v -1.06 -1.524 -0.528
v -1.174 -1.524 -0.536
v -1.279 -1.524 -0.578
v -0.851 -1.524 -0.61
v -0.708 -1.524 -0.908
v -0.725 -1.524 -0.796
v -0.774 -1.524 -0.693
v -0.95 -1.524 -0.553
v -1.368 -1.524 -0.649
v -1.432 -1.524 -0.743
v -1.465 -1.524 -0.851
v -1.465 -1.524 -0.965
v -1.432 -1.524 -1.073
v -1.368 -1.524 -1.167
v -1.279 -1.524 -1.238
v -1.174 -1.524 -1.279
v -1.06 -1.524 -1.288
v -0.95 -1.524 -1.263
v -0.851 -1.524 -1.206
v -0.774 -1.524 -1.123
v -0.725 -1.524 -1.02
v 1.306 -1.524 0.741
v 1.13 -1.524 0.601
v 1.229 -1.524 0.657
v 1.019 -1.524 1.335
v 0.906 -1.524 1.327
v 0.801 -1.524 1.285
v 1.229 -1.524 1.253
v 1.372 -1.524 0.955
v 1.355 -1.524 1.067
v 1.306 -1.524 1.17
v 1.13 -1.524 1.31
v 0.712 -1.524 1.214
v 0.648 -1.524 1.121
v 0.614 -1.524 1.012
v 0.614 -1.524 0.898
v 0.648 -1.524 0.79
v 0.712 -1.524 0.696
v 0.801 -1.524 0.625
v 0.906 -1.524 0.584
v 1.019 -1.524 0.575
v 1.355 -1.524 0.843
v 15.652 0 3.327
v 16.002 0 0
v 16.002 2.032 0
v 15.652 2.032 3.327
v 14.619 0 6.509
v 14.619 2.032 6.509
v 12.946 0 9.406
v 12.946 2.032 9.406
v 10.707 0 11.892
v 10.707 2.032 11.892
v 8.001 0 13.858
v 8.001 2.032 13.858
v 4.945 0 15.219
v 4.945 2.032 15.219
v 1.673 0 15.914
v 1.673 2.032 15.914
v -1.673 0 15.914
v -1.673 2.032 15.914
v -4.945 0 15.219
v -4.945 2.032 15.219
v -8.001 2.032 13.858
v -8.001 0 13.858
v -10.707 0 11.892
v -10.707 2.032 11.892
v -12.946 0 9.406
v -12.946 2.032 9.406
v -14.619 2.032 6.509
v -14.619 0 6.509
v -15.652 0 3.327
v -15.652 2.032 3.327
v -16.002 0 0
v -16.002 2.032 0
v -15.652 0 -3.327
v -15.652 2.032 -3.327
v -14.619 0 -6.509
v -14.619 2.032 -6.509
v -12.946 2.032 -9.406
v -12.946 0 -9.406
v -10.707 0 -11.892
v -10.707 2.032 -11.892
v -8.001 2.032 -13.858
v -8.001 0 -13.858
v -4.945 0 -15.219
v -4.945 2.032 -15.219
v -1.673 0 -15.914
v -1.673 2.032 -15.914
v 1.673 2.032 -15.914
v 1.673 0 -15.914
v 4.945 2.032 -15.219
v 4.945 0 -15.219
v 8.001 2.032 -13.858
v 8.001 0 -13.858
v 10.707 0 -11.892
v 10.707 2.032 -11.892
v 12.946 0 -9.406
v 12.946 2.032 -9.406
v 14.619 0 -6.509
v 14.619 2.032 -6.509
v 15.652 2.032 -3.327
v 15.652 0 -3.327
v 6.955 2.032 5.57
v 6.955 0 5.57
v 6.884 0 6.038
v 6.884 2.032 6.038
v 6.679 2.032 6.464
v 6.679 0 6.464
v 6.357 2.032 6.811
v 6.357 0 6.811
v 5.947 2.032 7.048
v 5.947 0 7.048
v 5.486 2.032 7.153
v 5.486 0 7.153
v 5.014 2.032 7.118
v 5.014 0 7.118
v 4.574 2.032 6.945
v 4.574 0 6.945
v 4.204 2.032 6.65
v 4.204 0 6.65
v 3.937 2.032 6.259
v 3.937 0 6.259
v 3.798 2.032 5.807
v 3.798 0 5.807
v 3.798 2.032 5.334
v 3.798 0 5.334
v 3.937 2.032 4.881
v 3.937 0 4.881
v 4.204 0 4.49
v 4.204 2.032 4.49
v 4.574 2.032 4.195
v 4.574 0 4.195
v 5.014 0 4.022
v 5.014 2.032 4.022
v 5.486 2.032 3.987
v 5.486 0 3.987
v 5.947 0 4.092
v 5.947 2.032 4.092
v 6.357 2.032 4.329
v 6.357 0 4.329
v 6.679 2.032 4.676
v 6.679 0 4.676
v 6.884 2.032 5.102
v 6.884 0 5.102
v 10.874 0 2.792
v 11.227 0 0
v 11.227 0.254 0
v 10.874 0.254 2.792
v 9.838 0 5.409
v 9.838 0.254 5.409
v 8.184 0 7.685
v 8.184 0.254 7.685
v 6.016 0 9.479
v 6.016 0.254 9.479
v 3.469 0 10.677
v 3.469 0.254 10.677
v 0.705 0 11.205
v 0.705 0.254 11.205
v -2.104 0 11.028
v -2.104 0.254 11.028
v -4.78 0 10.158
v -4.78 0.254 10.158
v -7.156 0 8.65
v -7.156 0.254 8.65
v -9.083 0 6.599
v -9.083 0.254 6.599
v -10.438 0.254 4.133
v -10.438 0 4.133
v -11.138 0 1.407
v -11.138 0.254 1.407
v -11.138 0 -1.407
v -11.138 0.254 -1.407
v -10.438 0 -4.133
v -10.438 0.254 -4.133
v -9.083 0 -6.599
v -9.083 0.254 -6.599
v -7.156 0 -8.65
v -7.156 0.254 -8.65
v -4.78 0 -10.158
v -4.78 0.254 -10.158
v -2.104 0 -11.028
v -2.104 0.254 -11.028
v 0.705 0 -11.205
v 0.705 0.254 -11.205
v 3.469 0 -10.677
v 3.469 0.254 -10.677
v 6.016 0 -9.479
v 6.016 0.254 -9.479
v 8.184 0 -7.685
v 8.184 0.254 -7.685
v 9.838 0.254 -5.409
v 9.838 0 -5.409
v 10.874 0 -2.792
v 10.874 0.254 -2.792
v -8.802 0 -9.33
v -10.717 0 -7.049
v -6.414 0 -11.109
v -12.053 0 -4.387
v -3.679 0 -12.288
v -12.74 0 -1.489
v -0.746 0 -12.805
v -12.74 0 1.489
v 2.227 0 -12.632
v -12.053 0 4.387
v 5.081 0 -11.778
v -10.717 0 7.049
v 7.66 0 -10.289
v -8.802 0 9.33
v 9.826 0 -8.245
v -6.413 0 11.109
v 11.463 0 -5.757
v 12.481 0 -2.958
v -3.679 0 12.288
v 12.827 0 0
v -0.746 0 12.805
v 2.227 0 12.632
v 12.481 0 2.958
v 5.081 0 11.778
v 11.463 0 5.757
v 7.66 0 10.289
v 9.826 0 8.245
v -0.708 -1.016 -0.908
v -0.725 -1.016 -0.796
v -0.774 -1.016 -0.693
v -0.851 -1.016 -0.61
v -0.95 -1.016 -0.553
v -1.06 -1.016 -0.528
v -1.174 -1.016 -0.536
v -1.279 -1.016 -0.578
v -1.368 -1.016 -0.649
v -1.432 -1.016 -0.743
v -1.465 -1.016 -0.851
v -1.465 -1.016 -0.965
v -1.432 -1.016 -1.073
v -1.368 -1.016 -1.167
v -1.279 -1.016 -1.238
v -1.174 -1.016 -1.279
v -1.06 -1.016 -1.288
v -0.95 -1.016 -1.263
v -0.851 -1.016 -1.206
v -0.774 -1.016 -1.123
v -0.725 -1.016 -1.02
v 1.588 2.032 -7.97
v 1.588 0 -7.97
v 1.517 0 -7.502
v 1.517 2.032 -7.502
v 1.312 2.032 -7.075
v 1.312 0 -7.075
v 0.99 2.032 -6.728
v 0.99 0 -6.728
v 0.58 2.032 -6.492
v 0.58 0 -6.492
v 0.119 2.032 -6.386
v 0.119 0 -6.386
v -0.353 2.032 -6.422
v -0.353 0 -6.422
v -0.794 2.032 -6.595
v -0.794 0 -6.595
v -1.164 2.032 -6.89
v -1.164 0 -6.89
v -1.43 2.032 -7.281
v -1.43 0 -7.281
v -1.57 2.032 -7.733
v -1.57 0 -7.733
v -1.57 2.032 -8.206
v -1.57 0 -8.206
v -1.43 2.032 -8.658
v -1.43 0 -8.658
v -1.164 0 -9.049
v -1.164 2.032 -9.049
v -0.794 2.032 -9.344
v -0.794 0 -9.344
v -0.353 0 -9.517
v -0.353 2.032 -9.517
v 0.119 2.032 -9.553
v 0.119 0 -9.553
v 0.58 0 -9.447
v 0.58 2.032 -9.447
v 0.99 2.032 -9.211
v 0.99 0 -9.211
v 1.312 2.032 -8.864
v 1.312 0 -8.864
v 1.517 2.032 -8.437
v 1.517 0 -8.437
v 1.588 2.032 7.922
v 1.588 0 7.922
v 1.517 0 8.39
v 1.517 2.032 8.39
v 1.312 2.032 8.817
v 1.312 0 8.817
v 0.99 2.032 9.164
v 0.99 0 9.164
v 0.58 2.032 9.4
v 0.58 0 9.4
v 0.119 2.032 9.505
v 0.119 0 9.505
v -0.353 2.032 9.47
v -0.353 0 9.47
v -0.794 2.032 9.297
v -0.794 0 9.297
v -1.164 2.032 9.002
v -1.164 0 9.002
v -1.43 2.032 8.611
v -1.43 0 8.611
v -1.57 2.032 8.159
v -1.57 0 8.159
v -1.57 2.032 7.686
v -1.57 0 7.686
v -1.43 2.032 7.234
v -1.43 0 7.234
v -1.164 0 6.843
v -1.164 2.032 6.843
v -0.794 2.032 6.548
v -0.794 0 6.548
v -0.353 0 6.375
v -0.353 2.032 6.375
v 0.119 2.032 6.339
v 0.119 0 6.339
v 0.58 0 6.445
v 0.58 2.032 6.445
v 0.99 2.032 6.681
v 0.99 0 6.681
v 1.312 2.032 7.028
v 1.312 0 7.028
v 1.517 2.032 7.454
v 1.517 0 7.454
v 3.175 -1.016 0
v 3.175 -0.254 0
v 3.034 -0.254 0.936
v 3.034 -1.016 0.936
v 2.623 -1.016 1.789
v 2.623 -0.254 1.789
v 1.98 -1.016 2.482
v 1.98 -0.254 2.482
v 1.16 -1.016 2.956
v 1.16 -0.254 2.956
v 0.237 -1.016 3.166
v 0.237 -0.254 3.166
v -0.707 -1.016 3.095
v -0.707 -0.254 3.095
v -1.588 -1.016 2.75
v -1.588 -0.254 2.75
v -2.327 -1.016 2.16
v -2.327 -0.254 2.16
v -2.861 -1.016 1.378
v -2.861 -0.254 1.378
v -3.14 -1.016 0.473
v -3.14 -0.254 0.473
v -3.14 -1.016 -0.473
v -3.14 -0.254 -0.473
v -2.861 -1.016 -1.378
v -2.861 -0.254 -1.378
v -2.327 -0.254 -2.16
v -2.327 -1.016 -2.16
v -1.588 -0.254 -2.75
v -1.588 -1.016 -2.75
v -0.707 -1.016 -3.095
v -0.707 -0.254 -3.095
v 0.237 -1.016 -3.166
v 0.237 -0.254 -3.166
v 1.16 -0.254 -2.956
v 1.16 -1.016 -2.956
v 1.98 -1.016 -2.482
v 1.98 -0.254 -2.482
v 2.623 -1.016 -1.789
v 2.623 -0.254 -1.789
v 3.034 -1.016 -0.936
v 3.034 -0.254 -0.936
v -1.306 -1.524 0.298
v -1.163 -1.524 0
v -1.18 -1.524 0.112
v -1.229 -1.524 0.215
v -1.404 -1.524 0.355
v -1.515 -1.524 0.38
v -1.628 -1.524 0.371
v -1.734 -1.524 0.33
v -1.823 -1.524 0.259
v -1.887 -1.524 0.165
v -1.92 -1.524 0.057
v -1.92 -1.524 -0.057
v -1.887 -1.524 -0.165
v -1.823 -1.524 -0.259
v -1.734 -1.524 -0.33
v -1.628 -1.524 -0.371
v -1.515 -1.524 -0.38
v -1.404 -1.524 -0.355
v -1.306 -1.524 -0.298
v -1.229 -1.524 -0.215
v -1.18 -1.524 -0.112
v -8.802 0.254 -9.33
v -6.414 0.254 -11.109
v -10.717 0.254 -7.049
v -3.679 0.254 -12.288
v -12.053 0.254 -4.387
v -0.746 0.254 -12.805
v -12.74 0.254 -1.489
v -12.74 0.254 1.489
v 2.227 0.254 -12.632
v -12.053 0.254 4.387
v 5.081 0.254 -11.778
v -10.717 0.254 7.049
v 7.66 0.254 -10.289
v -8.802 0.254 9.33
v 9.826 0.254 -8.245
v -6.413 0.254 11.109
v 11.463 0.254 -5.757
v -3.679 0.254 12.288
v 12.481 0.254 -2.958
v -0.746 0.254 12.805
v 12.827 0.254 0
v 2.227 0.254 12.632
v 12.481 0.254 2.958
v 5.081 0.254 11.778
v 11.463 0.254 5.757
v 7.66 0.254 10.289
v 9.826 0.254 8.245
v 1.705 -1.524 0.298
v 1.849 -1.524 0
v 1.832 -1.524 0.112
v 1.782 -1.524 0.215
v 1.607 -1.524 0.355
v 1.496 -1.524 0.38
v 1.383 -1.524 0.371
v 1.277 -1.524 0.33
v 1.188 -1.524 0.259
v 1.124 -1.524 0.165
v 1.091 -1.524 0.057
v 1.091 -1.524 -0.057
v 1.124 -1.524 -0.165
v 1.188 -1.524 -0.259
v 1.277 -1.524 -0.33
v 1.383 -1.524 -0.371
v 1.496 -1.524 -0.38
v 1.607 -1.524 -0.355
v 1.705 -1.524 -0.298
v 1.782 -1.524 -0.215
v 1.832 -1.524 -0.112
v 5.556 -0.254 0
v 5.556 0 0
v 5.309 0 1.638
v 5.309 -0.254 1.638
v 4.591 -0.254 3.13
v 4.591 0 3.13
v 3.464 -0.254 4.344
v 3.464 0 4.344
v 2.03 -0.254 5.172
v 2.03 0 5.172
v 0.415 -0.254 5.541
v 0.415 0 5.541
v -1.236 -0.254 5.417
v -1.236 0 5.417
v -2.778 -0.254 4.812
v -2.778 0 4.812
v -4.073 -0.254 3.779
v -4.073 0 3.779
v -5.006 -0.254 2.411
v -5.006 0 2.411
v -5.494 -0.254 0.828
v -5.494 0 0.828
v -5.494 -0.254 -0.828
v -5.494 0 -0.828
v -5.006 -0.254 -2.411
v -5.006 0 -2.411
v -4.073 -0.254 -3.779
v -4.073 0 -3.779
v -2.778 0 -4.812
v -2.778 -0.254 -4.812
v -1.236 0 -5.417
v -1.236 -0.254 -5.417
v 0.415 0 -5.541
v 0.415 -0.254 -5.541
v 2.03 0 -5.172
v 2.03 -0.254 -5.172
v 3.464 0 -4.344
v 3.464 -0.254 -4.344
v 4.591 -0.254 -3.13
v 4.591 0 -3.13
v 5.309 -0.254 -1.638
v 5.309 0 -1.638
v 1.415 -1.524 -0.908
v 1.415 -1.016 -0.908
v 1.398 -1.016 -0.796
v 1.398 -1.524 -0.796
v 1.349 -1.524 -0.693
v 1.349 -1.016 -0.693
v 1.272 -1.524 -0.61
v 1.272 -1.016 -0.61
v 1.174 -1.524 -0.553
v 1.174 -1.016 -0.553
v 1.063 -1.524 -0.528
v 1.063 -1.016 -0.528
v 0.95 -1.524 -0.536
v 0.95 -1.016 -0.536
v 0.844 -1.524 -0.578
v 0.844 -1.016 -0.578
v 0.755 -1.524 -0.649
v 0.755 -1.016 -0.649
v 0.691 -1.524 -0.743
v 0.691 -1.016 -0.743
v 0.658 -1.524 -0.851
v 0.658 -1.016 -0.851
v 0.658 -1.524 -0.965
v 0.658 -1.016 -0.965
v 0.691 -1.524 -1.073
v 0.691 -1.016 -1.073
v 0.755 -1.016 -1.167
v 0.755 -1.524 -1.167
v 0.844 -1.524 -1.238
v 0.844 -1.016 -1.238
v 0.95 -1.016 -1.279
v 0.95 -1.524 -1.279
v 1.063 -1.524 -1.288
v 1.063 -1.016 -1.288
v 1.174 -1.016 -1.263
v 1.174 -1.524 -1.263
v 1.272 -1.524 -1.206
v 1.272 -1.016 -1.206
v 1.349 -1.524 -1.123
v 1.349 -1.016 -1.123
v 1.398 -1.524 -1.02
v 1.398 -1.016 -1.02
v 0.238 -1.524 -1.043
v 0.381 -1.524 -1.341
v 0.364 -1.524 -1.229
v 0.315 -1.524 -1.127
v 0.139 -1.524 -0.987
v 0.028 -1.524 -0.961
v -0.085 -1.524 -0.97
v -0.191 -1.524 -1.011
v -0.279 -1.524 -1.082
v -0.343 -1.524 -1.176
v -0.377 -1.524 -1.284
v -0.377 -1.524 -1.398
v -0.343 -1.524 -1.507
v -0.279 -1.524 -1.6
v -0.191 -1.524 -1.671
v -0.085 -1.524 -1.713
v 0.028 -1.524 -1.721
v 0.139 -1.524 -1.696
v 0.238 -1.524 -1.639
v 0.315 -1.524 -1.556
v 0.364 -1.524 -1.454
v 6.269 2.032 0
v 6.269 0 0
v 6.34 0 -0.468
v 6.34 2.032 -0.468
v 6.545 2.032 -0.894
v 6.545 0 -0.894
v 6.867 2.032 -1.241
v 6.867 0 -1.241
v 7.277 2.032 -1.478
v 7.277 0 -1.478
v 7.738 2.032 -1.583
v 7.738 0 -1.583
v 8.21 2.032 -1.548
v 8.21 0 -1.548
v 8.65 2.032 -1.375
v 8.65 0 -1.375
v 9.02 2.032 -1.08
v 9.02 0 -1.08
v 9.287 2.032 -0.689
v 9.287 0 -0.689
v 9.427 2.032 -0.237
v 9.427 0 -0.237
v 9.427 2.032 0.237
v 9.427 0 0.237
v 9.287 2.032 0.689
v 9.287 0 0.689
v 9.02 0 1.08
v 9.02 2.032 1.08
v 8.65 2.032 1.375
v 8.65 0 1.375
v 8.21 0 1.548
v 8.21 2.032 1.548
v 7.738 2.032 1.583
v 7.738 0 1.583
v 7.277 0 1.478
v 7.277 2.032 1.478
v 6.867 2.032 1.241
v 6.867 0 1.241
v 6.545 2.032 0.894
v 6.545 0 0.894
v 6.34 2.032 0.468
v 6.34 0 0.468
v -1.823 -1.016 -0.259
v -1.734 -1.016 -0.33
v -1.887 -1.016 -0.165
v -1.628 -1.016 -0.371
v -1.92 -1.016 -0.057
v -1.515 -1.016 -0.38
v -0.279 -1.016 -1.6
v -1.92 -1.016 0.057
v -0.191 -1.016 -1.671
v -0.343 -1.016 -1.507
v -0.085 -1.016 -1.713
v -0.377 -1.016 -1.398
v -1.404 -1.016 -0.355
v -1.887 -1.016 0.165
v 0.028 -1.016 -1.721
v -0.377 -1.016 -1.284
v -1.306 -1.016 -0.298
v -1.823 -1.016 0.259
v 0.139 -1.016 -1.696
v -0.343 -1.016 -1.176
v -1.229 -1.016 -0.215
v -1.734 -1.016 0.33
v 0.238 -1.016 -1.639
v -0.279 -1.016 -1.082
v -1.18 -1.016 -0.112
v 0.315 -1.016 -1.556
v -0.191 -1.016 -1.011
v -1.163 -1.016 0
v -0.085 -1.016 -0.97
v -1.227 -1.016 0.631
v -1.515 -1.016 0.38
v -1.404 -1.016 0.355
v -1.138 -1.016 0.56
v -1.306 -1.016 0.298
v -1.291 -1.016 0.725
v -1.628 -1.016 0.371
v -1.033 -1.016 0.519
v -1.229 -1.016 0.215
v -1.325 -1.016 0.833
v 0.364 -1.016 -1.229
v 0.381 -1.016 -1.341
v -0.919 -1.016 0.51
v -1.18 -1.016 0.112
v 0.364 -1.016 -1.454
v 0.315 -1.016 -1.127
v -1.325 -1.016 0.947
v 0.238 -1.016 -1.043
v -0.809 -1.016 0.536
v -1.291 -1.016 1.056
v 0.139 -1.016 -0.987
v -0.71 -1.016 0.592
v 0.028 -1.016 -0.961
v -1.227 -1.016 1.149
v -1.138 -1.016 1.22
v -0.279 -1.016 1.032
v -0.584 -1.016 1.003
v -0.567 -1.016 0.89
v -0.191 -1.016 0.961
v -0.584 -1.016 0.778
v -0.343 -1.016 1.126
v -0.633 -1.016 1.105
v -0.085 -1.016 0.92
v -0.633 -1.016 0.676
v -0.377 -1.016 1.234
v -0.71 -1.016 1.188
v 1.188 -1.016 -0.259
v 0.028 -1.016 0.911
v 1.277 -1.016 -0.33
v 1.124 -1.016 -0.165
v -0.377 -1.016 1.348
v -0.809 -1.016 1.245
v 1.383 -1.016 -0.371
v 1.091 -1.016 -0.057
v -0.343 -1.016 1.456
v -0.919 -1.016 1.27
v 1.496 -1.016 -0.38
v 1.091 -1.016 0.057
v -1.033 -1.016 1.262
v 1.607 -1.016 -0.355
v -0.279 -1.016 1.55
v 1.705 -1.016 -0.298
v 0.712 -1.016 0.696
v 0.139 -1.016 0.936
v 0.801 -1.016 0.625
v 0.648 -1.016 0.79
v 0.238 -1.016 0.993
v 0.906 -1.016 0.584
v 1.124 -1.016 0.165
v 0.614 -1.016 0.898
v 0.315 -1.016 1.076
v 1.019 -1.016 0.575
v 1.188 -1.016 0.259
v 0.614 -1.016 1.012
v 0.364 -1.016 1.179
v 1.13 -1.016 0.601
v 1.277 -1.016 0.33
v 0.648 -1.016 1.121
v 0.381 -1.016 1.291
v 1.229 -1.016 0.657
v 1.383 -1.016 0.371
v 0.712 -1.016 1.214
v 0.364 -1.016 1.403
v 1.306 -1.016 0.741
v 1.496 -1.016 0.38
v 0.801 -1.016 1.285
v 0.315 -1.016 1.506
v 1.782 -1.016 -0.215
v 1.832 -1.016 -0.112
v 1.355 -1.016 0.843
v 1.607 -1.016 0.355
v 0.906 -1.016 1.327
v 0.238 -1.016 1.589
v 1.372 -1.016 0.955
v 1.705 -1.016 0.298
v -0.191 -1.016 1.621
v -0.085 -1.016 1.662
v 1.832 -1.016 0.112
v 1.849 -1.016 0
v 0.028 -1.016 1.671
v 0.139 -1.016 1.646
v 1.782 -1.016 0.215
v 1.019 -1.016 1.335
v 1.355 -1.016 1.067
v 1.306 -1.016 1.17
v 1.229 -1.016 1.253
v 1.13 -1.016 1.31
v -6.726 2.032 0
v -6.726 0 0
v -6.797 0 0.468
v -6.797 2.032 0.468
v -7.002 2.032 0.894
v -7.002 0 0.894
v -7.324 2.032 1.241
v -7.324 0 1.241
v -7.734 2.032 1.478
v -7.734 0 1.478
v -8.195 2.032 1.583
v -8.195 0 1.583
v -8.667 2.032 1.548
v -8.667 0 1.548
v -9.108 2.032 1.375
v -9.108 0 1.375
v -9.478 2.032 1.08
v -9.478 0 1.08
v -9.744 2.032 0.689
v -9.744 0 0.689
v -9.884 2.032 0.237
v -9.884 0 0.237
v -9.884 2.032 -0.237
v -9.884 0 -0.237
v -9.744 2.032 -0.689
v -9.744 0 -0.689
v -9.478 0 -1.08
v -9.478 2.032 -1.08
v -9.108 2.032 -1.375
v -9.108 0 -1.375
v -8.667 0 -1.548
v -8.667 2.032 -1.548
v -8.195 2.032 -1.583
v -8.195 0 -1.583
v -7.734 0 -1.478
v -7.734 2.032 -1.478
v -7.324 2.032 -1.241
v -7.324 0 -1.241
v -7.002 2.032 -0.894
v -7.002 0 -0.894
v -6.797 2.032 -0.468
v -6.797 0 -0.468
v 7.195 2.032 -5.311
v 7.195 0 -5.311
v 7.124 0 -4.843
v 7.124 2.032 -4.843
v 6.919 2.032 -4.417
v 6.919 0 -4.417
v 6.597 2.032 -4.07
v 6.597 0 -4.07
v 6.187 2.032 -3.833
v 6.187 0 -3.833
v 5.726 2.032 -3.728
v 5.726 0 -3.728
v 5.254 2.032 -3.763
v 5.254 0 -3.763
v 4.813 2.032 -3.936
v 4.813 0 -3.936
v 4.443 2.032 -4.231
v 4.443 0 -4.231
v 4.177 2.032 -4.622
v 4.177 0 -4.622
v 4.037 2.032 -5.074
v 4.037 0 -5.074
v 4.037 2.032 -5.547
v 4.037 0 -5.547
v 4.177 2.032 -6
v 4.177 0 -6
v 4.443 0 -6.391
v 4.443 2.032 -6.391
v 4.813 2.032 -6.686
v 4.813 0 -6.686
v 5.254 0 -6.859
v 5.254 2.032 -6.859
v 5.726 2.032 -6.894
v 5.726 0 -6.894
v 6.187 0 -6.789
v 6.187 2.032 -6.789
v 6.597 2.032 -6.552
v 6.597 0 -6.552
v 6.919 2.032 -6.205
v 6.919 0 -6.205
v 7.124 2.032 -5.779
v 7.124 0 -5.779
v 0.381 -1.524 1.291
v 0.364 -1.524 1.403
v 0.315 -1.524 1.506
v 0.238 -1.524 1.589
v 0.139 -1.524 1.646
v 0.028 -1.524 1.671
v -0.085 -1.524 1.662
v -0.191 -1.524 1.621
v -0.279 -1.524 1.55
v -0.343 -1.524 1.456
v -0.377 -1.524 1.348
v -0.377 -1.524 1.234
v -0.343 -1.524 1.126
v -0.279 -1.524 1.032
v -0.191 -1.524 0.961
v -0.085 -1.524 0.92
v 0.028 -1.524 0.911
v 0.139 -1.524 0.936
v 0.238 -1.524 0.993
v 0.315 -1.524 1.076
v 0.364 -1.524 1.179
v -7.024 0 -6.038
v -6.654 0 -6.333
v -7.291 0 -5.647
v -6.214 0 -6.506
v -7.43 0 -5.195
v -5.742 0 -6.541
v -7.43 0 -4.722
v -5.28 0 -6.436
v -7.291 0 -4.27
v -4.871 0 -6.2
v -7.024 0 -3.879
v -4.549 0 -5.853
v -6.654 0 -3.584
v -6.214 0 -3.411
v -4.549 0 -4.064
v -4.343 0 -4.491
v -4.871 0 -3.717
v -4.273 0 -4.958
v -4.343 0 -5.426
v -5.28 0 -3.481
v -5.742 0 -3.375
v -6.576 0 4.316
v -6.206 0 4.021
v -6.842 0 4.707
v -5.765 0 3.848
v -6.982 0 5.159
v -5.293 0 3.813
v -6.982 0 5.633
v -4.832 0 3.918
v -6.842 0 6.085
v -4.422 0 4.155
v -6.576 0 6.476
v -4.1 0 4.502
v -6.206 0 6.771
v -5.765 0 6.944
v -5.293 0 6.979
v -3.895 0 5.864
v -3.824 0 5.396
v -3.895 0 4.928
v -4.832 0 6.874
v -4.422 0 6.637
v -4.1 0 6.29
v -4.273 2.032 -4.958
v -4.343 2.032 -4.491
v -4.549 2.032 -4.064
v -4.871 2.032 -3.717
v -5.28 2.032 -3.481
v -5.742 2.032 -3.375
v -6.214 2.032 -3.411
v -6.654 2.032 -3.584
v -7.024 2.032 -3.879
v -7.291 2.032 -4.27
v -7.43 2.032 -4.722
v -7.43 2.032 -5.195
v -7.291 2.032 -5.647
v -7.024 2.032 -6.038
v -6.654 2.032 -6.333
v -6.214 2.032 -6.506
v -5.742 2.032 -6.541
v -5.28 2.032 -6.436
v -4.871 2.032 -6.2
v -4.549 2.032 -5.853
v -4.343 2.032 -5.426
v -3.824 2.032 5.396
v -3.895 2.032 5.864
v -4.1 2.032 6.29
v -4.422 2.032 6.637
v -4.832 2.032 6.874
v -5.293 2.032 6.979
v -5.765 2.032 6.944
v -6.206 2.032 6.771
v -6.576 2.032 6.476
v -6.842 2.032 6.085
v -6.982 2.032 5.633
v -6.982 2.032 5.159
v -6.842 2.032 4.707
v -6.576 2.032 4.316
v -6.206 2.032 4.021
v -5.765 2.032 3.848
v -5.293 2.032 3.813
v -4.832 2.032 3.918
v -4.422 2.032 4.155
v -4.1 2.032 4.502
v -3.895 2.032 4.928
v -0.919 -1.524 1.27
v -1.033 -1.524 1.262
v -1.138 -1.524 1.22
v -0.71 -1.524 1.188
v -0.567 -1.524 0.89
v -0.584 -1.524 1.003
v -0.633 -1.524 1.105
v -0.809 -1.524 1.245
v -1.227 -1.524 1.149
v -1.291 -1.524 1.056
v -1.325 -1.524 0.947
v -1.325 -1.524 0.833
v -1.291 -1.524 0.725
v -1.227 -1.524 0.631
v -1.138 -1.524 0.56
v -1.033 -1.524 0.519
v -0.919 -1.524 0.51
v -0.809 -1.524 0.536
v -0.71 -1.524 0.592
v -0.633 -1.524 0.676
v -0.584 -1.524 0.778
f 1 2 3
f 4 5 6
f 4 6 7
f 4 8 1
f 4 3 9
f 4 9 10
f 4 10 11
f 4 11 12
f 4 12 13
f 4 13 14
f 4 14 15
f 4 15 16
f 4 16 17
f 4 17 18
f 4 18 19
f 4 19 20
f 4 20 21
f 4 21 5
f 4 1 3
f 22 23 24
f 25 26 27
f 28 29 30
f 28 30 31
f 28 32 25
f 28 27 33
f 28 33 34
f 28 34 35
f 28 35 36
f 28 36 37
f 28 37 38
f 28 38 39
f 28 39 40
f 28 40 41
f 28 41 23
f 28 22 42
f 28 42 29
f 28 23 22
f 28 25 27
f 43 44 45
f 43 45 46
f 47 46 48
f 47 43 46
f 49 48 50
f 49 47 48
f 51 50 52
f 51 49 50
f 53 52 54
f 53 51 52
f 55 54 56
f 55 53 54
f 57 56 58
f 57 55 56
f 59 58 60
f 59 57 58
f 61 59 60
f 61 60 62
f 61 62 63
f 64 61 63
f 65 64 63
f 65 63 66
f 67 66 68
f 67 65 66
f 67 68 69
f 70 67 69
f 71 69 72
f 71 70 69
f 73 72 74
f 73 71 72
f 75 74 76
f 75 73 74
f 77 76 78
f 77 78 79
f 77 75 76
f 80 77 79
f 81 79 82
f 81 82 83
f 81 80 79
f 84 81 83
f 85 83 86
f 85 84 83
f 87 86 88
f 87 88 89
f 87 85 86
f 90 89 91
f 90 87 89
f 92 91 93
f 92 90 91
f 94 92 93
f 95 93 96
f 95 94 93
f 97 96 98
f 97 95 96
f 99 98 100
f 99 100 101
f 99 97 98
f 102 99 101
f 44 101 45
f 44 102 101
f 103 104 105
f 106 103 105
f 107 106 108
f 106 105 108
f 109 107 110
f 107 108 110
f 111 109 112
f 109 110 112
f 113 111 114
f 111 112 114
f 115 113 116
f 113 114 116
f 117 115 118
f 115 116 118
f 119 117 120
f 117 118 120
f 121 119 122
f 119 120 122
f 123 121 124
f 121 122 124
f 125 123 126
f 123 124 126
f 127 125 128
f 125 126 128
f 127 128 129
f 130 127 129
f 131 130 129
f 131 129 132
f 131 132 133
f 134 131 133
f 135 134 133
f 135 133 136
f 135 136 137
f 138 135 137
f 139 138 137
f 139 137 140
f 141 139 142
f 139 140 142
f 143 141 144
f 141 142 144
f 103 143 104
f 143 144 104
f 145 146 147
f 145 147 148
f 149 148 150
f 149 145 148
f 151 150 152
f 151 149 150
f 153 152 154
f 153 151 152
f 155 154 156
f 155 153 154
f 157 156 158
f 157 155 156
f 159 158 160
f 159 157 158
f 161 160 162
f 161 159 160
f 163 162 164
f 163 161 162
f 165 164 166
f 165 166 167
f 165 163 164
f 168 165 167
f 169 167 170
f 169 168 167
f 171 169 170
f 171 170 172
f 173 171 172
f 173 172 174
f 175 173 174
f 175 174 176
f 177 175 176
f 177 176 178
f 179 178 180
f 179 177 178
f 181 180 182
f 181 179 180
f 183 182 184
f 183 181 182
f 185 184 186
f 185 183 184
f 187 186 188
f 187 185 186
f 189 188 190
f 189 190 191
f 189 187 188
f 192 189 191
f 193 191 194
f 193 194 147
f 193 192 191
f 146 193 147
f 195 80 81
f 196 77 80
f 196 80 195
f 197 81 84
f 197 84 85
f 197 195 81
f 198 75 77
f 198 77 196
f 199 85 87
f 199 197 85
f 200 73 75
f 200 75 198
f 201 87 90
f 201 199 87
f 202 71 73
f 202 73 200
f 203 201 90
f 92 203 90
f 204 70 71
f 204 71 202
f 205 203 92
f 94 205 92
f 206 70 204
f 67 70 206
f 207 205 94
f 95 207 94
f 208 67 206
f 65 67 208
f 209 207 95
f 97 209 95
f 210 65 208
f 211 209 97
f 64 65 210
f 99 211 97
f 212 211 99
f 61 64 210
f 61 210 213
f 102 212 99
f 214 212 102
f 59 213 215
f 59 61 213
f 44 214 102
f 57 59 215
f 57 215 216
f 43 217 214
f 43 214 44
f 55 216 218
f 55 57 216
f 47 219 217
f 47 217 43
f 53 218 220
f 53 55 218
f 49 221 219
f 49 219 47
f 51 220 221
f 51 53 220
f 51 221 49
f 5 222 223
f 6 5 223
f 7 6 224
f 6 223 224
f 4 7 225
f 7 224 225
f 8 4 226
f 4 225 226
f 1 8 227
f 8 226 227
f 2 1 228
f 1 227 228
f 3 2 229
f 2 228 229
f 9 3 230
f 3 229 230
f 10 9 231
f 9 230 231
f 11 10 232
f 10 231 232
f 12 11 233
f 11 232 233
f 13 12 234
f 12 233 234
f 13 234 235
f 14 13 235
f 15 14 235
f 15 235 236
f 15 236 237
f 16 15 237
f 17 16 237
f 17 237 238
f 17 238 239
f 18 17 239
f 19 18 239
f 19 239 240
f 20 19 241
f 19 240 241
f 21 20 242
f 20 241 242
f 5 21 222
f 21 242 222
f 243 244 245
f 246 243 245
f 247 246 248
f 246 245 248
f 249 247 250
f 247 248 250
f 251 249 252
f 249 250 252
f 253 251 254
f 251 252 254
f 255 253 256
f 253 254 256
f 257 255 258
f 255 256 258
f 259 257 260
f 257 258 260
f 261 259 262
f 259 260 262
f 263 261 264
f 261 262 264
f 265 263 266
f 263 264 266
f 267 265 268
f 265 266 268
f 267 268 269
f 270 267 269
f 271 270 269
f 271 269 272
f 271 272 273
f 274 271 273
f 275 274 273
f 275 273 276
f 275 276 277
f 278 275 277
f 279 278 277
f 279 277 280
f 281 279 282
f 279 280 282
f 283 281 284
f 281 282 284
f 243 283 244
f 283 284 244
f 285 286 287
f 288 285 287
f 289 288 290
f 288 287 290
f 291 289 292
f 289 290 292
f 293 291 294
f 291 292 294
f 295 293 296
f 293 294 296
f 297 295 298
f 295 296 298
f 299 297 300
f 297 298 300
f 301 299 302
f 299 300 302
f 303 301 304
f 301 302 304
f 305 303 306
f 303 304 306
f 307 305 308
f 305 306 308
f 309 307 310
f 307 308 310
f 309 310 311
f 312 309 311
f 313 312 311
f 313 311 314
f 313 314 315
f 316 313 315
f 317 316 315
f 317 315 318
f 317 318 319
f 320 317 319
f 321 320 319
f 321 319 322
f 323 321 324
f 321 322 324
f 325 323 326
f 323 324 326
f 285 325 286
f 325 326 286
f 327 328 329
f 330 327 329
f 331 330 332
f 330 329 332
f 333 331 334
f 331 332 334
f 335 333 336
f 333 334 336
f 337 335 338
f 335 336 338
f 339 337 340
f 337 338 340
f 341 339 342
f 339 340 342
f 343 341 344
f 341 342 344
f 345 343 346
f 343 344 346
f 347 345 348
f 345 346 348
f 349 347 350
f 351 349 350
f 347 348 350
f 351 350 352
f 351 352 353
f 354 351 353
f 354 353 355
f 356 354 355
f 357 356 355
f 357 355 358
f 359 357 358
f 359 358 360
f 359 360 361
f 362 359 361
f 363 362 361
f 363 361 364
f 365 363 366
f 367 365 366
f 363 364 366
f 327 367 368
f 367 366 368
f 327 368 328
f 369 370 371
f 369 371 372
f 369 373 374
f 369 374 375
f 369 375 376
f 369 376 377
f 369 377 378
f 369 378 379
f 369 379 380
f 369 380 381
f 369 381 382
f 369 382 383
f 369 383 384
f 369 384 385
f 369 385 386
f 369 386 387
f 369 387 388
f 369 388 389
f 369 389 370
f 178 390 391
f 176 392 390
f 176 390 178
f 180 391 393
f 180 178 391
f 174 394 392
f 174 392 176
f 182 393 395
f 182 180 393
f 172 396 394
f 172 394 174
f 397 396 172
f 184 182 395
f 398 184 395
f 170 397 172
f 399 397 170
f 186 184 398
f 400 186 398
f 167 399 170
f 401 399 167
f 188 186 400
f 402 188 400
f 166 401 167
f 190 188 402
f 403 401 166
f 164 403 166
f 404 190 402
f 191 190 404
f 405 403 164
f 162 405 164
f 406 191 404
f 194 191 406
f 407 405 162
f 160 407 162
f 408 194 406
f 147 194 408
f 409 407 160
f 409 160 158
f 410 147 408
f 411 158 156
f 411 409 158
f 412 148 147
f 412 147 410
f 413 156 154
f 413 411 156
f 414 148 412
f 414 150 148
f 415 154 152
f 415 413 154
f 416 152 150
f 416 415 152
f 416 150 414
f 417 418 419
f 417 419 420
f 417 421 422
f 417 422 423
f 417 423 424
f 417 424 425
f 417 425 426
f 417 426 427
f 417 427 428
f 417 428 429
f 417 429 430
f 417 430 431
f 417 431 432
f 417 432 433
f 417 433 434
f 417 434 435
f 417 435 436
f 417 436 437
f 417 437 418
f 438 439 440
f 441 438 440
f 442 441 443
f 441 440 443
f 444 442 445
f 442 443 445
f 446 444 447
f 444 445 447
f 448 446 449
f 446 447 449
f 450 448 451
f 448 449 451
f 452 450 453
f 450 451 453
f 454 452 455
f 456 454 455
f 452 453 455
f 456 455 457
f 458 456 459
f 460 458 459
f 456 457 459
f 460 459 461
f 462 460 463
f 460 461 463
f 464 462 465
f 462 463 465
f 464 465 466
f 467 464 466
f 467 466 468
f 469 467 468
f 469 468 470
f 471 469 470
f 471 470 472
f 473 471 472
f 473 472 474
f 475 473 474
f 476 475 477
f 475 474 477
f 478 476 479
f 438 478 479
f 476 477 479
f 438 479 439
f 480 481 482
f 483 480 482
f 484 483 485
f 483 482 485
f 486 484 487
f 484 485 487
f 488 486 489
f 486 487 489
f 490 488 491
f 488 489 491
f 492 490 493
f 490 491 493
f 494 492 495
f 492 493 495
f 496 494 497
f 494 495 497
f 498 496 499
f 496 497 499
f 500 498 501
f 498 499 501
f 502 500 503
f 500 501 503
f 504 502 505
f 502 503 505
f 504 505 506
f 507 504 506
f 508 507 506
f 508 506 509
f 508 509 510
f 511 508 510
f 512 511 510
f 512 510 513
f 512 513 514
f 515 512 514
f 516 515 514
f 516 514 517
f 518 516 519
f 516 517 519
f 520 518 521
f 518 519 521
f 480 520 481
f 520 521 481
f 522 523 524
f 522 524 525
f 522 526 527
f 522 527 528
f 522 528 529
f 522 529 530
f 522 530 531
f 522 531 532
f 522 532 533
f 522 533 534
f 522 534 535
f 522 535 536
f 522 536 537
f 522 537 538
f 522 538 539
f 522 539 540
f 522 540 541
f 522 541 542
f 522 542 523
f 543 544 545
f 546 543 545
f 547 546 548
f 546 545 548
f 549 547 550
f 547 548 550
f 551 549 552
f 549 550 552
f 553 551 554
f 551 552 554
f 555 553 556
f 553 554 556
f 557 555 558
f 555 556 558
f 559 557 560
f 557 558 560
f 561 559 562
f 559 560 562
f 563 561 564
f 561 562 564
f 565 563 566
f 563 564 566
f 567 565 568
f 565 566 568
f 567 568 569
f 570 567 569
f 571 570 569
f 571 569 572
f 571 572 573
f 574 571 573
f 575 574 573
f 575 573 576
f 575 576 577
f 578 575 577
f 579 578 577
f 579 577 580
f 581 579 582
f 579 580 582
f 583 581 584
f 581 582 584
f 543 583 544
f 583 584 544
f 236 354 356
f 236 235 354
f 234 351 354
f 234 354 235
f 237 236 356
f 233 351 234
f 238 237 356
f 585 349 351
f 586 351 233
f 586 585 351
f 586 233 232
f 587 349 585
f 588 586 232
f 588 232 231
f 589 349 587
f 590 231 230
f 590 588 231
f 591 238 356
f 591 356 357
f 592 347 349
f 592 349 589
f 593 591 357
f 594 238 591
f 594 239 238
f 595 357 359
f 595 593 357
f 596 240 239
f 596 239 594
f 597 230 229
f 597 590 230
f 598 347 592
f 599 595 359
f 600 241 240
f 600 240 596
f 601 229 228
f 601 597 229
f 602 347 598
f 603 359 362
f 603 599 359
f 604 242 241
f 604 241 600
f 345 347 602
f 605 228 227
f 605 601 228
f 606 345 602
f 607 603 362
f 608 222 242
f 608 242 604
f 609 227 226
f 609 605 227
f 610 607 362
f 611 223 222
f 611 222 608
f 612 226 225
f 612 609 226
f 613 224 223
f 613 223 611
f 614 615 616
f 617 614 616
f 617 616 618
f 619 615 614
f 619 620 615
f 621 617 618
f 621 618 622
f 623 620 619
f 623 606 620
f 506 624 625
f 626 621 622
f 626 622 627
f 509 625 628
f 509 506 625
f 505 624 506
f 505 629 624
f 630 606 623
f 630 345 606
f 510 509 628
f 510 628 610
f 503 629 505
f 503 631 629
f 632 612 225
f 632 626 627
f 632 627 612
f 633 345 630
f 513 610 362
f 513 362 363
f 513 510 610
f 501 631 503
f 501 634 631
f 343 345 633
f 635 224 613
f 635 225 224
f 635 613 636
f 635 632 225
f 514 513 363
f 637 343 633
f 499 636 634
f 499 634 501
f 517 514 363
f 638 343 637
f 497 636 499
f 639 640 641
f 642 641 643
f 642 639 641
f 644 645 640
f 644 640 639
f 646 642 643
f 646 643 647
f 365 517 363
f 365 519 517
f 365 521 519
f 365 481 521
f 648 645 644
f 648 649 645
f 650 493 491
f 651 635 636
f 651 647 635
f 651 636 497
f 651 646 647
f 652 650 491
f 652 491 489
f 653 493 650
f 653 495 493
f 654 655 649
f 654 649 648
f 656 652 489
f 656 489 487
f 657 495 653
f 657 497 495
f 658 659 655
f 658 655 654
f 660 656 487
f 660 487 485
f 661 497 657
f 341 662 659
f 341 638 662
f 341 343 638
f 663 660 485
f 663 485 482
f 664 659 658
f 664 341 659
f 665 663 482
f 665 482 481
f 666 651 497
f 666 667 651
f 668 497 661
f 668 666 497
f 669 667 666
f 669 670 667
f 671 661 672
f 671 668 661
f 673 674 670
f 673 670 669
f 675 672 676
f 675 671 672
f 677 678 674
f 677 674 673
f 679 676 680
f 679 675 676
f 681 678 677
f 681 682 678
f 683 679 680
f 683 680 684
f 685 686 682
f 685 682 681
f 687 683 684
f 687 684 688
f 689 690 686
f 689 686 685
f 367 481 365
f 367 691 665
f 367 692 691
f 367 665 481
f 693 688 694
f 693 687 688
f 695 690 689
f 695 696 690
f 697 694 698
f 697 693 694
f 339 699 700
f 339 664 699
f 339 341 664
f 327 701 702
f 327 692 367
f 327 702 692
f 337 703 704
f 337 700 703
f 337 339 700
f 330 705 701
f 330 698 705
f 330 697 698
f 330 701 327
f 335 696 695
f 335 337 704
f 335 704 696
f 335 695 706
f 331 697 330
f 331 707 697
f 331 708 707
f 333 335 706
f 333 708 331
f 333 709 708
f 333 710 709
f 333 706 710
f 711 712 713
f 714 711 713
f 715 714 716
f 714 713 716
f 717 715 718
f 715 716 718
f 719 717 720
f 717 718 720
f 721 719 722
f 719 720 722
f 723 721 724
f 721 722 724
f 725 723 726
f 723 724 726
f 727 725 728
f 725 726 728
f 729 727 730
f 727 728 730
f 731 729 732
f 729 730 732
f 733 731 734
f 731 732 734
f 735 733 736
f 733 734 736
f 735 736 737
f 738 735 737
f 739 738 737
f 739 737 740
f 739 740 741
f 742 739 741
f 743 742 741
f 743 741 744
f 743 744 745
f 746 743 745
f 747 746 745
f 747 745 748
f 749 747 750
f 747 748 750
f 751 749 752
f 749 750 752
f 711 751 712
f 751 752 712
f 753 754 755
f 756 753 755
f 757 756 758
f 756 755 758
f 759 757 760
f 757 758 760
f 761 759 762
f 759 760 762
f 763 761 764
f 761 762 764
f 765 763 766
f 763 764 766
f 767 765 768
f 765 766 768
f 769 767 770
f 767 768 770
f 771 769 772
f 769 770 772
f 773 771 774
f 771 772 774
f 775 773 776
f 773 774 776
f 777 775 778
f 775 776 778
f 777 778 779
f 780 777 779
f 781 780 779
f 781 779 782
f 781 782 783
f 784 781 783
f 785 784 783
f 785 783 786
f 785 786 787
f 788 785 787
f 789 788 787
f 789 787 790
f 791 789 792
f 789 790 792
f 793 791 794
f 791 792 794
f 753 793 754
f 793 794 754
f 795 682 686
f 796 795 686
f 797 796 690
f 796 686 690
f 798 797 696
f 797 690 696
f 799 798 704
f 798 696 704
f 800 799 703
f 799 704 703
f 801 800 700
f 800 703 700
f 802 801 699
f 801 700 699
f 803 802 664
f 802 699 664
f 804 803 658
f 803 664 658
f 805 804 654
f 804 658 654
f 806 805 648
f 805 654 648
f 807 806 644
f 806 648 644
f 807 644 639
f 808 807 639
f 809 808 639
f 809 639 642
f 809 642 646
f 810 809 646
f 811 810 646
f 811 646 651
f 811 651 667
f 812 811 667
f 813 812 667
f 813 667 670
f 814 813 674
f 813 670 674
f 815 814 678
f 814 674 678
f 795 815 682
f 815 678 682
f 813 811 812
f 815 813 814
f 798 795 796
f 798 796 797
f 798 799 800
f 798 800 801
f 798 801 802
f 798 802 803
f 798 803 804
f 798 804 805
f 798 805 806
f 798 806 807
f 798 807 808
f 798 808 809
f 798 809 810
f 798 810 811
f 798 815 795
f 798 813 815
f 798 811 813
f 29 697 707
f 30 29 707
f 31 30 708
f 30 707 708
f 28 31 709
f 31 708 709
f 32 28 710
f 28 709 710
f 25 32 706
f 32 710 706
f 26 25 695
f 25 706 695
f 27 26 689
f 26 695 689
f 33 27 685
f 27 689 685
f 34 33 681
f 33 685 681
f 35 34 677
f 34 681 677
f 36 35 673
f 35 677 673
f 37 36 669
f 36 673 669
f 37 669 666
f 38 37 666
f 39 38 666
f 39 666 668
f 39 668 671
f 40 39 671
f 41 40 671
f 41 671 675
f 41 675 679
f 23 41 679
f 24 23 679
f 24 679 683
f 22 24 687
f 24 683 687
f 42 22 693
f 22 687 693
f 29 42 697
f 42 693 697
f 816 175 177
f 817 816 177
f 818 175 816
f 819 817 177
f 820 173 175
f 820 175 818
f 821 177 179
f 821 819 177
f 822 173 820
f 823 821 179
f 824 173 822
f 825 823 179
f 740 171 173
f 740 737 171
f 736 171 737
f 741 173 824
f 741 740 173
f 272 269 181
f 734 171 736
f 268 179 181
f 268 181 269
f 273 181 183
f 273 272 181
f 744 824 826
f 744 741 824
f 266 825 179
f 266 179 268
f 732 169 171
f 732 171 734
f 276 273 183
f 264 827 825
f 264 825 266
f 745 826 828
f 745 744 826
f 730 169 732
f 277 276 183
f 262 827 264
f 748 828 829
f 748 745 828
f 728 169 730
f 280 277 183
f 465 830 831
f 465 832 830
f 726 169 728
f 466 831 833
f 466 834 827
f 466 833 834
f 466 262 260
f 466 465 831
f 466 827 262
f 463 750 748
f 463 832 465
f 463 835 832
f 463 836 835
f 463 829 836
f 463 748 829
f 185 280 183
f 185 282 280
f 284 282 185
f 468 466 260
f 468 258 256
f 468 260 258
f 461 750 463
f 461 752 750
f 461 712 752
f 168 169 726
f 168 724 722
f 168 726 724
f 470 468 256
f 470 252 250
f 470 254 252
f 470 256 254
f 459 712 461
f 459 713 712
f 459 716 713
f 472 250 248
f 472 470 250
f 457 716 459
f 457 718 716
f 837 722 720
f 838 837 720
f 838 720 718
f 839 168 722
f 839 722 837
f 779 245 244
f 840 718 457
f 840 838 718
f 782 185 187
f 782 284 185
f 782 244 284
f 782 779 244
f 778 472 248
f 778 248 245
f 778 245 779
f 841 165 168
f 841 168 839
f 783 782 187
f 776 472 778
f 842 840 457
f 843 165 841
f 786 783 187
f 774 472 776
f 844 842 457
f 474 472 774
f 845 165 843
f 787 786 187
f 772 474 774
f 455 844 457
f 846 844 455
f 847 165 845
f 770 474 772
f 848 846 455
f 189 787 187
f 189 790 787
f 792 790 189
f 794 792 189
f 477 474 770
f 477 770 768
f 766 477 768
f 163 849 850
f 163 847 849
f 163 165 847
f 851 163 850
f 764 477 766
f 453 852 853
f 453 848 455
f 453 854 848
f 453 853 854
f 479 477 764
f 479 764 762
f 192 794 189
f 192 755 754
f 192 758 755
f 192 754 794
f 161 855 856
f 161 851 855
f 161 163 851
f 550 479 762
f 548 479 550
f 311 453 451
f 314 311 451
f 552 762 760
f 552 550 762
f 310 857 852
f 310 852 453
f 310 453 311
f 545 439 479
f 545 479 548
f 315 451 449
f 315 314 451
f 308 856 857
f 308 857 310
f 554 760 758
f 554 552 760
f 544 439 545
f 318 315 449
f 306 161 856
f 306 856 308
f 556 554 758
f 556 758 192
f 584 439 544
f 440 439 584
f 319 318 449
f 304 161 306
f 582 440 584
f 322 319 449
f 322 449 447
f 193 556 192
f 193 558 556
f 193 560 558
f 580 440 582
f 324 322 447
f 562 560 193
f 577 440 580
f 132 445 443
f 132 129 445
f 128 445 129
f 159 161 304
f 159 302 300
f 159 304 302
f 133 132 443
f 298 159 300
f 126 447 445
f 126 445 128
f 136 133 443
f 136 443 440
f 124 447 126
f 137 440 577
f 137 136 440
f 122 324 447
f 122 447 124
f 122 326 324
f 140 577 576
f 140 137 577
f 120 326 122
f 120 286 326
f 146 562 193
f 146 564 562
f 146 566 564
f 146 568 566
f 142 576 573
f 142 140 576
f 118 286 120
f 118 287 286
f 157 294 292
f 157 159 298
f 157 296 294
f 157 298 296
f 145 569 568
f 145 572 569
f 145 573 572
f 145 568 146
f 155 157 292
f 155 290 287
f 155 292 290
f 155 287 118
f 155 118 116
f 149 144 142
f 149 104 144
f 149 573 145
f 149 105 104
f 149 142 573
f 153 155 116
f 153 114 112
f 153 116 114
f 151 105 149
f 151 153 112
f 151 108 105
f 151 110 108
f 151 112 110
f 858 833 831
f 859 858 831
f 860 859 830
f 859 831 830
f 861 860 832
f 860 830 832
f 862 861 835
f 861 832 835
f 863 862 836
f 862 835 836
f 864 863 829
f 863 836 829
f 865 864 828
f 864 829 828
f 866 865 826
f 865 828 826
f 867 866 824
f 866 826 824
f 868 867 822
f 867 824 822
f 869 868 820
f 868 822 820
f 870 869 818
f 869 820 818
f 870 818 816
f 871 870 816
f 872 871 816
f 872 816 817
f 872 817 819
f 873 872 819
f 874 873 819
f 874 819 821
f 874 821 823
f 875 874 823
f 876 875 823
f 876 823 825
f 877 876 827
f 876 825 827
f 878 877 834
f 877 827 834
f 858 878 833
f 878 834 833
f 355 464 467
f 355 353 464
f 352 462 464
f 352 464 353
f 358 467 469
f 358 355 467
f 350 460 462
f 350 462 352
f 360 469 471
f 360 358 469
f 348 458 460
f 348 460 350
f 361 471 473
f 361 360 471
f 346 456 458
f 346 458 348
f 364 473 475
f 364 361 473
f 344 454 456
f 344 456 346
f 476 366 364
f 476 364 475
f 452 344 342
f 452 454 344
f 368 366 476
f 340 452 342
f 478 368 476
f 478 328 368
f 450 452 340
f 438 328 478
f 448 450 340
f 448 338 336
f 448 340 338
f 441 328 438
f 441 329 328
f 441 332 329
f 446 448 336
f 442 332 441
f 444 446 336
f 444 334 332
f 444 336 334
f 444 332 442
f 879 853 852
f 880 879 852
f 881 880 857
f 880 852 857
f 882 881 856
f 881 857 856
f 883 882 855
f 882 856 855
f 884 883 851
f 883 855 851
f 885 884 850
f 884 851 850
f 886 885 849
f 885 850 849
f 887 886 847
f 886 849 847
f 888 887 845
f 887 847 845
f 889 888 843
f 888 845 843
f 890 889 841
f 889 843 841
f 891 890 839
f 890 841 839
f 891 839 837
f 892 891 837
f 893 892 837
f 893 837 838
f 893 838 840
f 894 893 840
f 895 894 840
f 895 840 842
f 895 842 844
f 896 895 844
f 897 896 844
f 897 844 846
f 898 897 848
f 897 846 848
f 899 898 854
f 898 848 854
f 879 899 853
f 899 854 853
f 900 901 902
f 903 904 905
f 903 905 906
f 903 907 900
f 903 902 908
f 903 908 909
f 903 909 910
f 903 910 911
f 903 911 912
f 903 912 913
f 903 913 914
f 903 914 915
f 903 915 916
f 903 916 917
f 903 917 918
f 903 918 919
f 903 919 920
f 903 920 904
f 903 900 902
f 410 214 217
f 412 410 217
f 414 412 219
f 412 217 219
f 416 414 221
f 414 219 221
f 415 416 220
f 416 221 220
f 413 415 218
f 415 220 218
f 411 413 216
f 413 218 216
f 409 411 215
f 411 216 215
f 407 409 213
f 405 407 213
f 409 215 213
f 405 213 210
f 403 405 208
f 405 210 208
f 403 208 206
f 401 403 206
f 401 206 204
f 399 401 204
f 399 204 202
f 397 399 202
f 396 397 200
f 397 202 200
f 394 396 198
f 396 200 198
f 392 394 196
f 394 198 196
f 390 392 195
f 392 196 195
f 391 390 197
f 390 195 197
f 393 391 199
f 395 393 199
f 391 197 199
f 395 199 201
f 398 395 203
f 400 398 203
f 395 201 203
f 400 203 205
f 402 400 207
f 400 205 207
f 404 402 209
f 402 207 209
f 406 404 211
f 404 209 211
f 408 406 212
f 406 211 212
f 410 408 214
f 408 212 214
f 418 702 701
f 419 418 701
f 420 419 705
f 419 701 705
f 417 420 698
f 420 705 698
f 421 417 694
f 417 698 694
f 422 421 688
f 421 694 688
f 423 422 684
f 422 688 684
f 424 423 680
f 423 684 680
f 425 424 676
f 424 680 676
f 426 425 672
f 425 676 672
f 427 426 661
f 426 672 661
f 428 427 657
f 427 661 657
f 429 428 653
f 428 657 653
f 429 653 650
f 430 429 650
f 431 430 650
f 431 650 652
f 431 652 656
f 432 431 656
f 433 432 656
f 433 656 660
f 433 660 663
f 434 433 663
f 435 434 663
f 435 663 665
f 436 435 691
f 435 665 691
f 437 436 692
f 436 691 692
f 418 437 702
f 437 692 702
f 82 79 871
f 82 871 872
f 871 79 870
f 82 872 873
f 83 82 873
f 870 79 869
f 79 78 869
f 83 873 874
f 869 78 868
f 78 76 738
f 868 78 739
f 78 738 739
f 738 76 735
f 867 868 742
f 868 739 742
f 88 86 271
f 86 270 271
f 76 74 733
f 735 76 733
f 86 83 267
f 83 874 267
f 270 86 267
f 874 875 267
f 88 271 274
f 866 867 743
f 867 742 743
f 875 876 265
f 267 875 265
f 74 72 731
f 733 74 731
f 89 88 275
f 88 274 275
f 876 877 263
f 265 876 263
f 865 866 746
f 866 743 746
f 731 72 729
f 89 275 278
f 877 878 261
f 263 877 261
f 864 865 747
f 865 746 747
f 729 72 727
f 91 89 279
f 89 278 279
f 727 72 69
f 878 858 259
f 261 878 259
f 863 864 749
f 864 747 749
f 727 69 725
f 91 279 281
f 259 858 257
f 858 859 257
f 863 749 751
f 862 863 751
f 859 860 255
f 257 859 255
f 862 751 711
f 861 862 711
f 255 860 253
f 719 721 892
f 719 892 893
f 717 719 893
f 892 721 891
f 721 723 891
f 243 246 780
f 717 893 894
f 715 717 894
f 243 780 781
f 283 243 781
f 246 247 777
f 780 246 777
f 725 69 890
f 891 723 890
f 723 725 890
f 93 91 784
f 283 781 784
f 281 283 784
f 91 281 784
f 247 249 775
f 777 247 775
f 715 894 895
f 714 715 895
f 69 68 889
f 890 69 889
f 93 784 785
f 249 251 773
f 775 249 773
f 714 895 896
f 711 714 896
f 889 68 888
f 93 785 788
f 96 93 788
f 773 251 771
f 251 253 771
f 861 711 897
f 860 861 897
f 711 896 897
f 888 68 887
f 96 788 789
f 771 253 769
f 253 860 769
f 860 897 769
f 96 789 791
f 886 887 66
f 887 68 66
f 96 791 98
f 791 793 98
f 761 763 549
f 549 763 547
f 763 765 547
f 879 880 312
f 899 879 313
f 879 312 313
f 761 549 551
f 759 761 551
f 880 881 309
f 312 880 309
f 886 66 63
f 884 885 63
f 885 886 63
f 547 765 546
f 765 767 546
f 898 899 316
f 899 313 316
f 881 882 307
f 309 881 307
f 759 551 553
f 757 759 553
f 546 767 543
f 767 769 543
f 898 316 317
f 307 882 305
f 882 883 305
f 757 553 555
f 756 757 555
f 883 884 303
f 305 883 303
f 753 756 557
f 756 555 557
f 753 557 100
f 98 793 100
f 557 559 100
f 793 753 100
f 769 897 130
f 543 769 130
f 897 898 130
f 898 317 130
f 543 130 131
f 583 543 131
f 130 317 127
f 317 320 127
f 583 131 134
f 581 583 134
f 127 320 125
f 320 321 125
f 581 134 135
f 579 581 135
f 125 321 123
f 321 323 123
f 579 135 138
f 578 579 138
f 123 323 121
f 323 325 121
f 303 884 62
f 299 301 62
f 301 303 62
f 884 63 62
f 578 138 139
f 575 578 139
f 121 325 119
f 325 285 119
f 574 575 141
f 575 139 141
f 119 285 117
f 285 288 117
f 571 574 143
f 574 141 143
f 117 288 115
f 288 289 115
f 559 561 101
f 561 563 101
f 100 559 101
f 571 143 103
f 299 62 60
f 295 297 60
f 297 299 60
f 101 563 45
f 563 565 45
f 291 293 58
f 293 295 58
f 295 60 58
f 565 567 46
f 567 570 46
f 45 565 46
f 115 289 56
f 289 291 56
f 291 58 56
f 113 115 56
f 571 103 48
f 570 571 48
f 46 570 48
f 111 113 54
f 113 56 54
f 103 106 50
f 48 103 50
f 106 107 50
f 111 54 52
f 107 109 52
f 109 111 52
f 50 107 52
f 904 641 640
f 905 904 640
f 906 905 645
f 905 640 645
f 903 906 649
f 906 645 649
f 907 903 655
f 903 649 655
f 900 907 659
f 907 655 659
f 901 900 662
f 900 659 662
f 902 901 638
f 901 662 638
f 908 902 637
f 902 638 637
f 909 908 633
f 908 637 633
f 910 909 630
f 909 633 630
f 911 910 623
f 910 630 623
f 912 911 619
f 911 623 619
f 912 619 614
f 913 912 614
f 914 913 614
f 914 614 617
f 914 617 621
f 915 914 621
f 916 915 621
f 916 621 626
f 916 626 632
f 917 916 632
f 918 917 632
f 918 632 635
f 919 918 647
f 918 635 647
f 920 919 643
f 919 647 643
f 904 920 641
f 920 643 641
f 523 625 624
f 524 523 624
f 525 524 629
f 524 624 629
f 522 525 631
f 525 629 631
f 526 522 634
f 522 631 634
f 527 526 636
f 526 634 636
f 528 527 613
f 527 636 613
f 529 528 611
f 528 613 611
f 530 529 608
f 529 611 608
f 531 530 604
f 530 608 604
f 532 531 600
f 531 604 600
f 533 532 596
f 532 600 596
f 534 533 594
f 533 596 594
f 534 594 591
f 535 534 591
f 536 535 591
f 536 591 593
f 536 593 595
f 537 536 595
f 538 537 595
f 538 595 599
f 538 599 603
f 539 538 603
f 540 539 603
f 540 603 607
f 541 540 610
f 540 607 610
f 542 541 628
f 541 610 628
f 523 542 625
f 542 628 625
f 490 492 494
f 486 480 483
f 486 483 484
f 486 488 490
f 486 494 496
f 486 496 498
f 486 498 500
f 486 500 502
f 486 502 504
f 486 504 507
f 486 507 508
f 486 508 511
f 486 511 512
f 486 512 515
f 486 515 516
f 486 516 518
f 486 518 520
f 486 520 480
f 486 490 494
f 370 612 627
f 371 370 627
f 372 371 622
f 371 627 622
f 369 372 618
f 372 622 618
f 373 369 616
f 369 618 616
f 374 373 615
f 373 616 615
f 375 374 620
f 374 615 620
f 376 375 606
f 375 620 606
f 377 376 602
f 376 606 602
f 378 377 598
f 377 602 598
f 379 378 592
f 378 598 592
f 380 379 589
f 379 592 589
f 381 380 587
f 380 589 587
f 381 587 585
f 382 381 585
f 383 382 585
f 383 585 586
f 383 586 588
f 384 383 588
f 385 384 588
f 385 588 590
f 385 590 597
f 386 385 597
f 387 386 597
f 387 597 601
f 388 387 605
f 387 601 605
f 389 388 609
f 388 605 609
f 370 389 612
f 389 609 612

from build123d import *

# Parameters (mm, degrees)
F0_R      = 16.002
F1_DEPTH  = 2.032
F3_R      = 12.827
F3_R_2    = 11.2268
F4_DEPTH  = 0.254
F2_R      = 1.5875
F5_DEPTH  = 2.032
F6_R      = 5.55625
F7_DEPTH  = 0.254
F8_R      = 3.175
F9_DEPTH  = 0.762
F10_R     = 0.381
F11_DEPTH = 0.508


with BuildPart() as f1:
    # F0 (on Front) → F1 (new body)
    with BuildSketch(Plane.XZ):
        Circle(F0_R)
    extrude(amount=-F1_DEPTH)

    # F3 (on face) → F4 (cut)
    with BuildSketch(Plane.XZ):
        Circle(F3_R)
        Circle(F3_R_2, mode=Mode.SUBTRACT)
    extrude(amount=-F4_DEPTH, mode=Mode.SUBTRACT)

    # F2 (on face) → F5 (cut)
    with BuildSketch(Plane.XZ):
        with Locations((0, -7.9695228487)):
            Circle(F2_R)
        with Locations((-5.8604669757, -4.9584284425)):
            Circle(F2_R)
        with BuildLine():
            Line((-6.7264510825, 0), (-9.9014510825, 0))
            ThreePointArc((-9.9014510825, 0), (-8.3139510825, -1.5875), (-6.7264510825, 0))
        make_face()
        with BuildLine():
            ThreePointArc((-6.7264510825, 0), (-8.3139510825, 1.5875), (-9.9014510825, 0))
            Line((-9.9014510825, 0), (-6.7264510825, 0))
        make_face()
        with Locations((-5.4118158296, 5.3960969672)):
            Circle(F2_R)
        with Locations((0, 7.9223643988)):
            Circle(F2_R)
        with Locations((5.3672702052, 5.5701895617)):
            Circle(F2_R)
        with BuildLine():
            Line((6.2692415476, 0), (9.4442415476, 0))
            ThreePointArc((9.4442415476, 0), (7.8567415476, 1.5875), (6.2692415476, 0))
        make_face()
        with BuildLine():
            ThreePointArc((6.2692415476, 0), (7.8567415476, -1.5875), (9.4442415476, 0))
            Line((9.4442415476, 0), (6.2692415476, 0))
        make_face()
        with Locations((5.607039202, -5.3108036518)):
            Circle(F2_R)
    extrude(amount=-F5_DEPTH, mode=Mode.SUBTRACT)

    # F6 (on face) → F7 (join)
    with BuildSketch(Plane.XZ):
        Circle(F6_R)
    extrude(amount=F7_DEPTH)

    # F8 (on face) → F9 (join)
    with BuildSketch(Plane.XZ.offset(0.254)):
        Circle(F8_R)
    extrude(amount=F9_DEPTH)

    # F10 (on face) → F11 (join)
    with BuildSketch(Plane.XZ.offset(1.016)):
        with Locations((-1.543693963, 0)):
            Circle(F10_R)
        with Locations((-0.9479312136, 0.8902023229)):
            Circle(F10_R)
        with Locations((0, 1.2909881785)):
            Circle(F10_R)
        with Locations((0.9910054901, 0.9551946484)):
            Circle(F10_R)
        with Locations((1.4676158223, 0)):
            Circle(F10_R)
        with Locations((1.0343337624, -0.9079179104)):
            Circle(F10_R)
        with Locations((0, -1.3411998874)):
            Circle(F10_R)
        with Locations((-1.0887479328, -0.9079179104)):
            Circle(F10_R)
    extrude(amount=F11_DEPTH)


solid = f1.part
